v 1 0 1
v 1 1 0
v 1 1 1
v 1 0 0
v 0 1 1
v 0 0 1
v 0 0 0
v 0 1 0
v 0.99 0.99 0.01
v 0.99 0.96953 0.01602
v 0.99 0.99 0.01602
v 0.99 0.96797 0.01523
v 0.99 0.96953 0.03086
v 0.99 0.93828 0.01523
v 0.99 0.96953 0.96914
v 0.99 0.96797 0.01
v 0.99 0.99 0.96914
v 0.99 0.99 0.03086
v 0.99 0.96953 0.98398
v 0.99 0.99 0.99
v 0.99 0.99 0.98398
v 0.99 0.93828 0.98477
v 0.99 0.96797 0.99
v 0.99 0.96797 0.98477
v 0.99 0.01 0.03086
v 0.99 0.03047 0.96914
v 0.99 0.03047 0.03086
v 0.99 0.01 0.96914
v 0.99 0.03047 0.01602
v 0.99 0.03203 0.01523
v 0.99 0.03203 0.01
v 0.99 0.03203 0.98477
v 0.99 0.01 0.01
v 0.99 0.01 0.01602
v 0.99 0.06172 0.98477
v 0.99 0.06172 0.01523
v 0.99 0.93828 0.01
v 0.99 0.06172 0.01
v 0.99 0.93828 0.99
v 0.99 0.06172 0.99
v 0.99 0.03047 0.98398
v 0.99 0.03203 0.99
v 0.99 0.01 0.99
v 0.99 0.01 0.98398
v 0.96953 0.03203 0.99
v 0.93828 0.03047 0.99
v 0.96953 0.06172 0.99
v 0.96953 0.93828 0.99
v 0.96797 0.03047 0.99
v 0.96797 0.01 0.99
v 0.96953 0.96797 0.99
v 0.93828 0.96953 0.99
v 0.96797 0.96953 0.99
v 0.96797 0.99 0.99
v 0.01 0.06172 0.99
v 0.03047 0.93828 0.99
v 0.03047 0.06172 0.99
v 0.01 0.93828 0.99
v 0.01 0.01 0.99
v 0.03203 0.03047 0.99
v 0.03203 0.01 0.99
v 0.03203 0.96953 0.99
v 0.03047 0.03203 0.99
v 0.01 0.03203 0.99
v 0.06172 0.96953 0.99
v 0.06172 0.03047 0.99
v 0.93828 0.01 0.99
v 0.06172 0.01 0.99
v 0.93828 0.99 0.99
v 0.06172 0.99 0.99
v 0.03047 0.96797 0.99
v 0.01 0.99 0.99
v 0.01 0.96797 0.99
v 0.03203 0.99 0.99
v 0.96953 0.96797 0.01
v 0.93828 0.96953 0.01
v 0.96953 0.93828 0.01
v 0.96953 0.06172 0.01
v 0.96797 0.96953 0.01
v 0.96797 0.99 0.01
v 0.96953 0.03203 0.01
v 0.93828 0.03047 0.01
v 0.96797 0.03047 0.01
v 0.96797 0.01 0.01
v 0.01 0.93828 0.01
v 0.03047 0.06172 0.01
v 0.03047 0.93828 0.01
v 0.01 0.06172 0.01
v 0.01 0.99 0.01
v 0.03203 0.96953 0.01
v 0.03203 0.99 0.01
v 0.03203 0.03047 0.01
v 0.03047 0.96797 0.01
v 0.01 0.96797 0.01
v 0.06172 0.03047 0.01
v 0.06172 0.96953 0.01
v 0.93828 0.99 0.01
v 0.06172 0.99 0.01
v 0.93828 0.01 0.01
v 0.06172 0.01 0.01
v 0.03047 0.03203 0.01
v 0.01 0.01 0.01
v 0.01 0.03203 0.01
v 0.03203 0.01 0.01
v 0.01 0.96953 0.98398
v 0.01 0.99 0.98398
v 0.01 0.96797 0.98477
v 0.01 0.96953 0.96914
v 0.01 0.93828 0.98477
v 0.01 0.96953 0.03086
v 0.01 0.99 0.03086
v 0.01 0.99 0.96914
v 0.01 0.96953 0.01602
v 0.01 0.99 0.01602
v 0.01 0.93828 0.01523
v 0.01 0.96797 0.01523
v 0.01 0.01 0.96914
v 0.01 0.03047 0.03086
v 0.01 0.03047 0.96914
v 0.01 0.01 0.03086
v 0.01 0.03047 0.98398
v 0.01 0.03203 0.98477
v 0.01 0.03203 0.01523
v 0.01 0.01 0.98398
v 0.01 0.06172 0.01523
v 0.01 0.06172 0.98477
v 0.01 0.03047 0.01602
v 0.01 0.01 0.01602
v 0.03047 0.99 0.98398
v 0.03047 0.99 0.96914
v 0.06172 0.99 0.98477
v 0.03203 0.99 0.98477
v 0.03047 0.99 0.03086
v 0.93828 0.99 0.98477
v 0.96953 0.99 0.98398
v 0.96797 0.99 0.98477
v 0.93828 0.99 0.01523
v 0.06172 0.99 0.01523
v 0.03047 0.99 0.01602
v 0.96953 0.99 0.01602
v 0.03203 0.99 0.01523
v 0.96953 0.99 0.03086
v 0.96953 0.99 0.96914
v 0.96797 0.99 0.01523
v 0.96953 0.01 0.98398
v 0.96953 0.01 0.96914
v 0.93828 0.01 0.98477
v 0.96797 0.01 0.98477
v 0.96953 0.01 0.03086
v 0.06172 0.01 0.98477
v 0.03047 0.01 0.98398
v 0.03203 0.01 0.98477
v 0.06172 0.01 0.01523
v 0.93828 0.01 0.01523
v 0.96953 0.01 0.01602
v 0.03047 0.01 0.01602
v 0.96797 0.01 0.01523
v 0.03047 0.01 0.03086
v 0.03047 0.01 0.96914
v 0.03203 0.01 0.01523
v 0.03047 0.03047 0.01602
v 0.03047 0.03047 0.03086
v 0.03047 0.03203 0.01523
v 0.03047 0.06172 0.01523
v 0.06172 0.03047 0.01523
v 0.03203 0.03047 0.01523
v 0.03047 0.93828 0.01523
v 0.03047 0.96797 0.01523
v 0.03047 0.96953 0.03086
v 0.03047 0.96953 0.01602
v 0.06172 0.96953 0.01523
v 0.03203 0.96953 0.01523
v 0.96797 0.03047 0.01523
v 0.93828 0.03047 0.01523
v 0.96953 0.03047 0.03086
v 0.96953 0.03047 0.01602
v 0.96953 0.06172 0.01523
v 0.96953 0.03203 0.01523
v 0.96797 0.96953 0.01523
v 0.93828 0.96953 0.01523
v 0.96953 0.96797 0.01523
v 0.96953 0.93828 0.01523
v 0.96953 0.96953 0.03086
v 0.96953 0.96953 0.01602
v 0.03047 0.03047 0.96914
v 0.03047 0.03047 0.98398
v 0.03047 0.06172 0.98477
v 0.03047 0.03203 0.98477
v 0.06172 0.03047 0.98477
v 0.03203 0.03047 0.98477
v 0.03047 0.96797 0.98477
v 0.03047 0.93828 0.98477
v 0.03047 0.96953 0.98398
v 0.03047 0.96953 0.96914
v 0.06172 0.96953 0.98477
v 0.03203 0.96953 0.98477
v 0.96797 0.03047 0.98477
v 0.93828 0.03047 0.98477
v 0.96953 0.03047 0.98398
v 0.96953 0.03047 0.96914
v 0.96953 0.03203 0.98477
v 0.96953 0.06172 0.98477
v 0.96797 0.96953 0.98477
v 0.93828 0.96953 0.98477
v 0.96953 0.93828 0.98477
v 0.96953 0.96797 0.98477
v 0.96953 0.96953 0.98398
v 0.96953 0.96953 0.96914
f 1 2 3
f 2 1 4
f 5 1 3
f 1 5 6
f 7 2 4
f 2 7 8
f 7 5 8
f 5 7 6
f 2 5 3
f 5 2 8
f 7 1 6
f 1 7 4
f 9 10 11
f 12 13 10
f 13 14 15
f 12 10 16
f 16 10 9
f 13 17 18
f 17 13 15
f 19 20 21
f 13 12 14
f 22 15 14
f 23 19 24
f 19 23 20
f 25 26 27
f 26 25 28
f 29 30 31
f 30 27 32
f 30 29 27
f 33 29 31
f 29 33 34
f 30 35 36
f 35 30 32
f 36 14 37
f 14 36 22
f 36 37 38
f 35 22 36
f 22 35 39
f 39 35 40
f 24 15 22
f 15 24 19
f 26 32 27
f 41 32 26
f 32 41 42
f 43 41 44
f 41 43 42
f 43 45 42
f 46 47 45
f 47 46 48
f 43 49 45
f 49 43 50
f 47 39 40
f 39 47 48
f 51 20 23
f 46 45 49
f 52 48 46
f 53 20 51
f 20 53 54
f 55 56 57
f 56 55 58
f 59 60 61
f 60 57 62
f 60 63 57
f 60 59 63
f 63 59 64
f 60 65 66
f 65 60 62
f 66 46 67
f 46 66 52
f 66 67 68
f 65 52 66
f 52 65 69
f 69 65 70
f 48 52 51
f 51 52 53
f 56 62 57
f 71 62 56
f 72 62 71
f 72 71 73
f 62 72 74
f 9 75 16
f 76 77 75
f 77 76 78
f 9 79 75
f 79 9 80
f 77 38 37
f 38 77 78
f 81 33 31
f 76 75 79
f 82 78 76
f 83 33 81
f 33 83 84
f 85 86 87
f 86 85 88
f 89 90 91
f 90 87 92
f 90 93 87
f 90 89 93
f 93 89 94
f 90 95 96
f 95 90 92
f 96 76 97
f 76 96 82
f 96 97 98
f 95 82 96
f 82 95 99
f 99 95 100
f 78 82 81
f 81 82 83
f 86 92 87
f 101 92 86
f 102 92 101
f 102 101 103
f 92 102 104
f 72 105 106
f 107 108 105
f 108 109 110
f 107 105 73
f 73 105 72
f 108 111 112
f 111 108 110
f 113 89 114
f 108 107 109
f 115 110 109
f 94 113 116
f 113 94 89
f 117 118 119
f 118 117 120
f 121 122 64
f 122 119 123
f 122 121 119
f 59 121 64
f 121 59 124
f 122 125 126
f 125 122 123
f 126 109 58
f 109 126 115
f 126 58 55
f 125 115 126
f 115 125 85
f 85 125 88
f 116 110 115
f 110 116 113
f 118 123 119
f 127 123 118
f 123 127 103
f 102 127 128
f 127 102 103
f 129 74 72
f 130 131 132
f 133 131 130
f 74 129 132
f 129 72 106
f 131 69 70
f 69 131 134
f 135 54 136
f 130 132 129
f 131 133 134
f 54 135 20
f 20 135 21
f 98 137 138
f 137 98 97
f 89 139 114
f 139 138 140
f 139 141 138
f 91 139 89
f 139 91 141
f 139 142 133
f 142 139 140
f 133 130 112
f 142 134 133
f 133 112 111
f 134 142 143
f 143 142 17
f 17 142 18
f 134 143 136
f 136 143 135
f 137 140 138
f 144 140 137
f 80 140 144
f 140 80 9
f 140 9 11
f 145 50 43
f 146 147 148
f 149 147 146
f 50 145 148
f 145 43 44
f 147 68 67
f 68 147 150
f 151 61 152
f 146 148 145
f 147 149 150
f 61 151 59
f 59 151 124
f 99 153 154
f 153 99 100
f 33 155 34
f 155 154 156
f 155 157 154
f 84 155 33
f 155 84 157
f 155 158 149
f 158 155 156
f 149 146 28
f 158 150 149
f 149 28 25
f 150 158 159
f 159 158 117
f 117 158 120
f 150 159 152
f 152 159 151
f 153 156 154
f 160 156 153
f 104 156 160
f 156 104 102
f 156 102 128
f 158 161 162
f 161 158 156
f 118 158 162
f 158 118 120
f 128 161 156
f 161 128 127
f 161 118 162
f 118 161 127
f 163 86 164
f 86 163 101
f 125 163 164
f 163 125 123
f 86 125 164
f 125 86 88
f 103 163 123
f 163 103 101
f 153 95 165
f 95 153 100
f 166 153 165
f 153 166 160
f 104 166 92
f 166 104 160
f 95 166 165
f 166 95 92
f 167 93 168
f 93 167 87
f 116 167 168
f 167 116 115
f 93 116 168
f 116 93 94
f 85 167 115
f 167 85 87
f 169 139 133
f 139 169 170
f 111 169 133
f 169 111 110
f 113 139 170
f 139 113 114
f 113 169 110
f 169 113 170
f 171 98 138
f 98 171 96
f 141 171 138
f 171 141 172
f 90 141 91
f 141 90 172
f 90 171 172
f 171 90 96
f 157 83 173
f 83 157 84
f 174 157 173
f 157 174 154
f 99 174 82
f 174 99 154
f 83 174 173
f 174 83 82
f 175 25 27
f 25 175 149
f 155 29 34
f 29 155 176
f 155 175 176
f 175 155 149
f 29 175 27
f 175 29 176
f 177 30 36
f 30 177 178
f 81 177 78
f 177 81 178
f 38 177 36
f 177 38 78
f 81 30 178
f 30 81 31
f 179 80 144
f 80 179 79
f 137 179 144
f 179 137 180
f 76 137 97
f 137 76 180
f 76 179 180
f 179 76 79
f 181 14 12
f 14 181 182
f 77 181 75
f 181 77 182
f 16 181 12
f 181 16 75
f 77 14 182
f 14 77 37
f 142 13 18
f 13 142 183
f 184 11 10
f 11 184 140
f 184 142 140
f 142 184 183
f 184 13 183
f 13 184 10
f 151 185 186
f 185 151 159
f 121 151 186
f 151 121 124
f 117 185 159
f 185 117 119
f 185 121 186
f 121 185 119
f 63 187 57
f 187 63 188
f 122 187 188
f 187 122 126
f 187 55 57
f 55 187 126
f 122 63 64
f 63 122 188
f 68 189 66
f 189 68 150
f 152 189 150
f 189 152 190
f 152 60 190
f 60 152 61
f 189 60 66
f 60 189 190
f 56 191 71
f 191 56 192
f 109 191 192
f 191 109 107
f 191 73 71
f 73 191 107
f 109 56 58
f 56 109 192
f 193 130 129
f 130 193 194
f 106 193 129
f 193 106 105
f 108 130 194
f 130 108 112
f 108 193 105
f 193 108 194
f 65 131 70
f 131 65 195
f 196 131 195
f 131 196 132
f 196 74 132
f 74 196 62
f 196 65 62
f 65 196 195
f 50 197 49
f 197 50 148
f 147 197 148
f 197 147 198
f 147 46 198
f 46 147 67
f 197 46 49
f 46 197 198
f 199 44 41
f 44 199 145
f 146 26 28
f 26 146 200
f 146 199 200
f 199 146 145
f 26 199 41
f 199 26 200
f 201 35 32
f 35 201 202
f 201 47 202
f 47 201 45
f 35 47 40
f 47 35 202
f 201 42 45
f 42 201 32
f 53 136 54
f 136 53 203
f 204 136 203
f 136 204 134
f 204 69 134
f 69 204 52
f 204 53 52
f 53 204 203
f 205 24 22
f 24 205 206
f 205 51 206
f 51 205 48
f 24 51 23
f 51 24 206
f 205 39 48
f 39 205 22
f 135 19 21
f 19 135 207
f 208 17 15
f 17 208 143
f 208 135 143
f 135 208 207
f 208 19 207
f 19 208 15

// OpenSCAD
translate([0.015625, 0.015625, 0.0234375]) color([0.6687095525163839, 0.6084946124880205, 0.9354113971140408]) cube([0.0296875, 0.0296875, 0.01484375], center=true);
translate([0.015625, 0.046875, 0.0078125]) color([0.40170597484563164, 0.9257642462472301, 0.7352475143256585]) cube([0.0296875, 0.0296875, 0.01484375], center=true);
translate([0.046875, 0.015625, 0.0078125]) color([0.9040805991886998, 0.8303556425691195, 0.04360117165228117]) cube([0.0296875, 0.0296875, 0.01484375], center=true);
translate([0.015625, 0.953125, 0.0078125]) color([0.19461635406133904, 0.24937487606759356, 0.948798389089598]) cube([0.0296875, 0.0296875, 0.01484375], center=true);
translate([0.015625, 0.984375, 0.0234375]) color([0.463582495028668, 0.8326751819056648, 0.9518902994268229]) cube([0.0296875, 0.0296875, 0.01484375], center=true);
translate([0.046875, 0.984375, 0.0078125]) color([0.6590575290507751, 0.08125165305796267, 0.4650668984349794]) cube([0.0296875, 0.0296875, 0.01484375], center=true);
translate([0.953125, 0.015625, 0.0078125]) color([0.7959185631816963, 0.11921151794914897, 0.3955919798495292]) cube([0.0296875, 0.0296875, 0.01484375], center=true);
translate([0.984375, 0.015625, 0.0234375]) color([0.9677071171037346, 0.6413149765805175, 0.6980206654320958]) cube([0.0296875, 0.0296875, 0.01484375], center=true);
translate([0.984375, 0.046875, 0.0078125]) color([0.8040097371122532, 0.02969664254607307, 0.6148562424214081]) cube([0.0296875, 0.0296875, 0.01484375], center=true);
translate([0.953125, 0.984375, 0.0078125]) color([0.8448719577880454, 0.4679553852673959, 0.08973588053163917]) cube([0.0296875, 0.0296875, 0.01484375], center=true);
translate([0.984375, 0.953125, 0.0078125]) color([0.4324405658485233, 0.6252018299529586, 0.7035550007040374]) cube([0.0296875, 0.0296875, 0.01484375], center=true);
translate([0.984375, 0.984375, 0.0234375]) color([0.5393448057318809, 0.2527674186168355, 0.3363254213178022]) cube([0.0296875, 0.0296875, 0.01484375], center=true);
translate([0.015625, 0.015625, 0.9765625]) color([0.11910676957782207, 0.14794946950639198, 0.11827804449452717]) cube([0.0296875, 0.0296875, 0.01484375], center=true);
translate([0.015625, 0.046875, 0.9921875]) color([0.9746683368563359, 0.7286099858778307, 0.49602632030784344]) cube([0.0296875, 0.0296875, 0.01484375], center=true);
translate([0.046875, 0.015625, 0.9921875]) color([0.10368777629760739, 0.7847886997296503, 0.21061420610757087]) cube([0.0296875, 0.0296875, 0.01484375], center=true);
translate([0.015625, 0.953125, 0.9921875]) color([0.5535247959118038, 0.46161292315131996, 0.18707801641186383]) cube([0.0296875, 0.0296875, 0.01484375], center=true);
translate([0.015625, 0.984375, 0.9765625]) color([0.1364153307796545, 0.7835387056505961, 0.10069382875703514]) cube([0.0296875, 0.0296875, 0.01484375], center=true);
translate([0.046875, 0.984375, 0.9921875]) color([0.8510722137641065, 0.09533324854005332, 0.7119995480635104]) cube([0.0296875, 0.0296875, 0.01484375], center=true);
translate([0.953125, 0.015625, 0.9921875]) color([0.9113847581011494, 0.6068644804350546, 0.6888686315180719]) cube([0.0296875, 0.0296875, 0.01484375], center=true);
translate([0.984375, 0.015625, 0.9765625]) color([0.746768908208267, 0.12345704399851087, 0.5898846042296045]) cube([0.0296875, 0.0296875, 0.01484375], center=true);
translate([0.984375, 0.046875, 0.9921875]) color([0.2755493590142797, 0.8424163848709234, 0.5575721317979958]) cube([0.0296875, 0.0296875, 0.01484375], center=true);
translate([0.953125, 0.984375, 0.9921875]) color([0.8784015234124647, 0.47739326970496154, 0.09079989490364004]) cube([0.0296875, 0.0296875, 0.01484375], center=true);
translate([0.984375, 0.953125, 0.9921875]) color([0.0566065179549472, 0.6319855242897215, 0.2930318592312755]) cube([0.0296875, 0.0296875, 0.01484375], center=true);
translate([0.984375, 0.984375, 0.9765625]) color([0.7481288948393144, 0.34215972325745514, 0.10558766446580636]) cube([0.0296875, 0.0296875, 0.01484375], center=true);
color([0.3,0.3,0.3,0.3]) difference() { cube([1,1,1]); translate([0.01,0.01,0.01]) cube([0.98,0.98,0.98]); }
